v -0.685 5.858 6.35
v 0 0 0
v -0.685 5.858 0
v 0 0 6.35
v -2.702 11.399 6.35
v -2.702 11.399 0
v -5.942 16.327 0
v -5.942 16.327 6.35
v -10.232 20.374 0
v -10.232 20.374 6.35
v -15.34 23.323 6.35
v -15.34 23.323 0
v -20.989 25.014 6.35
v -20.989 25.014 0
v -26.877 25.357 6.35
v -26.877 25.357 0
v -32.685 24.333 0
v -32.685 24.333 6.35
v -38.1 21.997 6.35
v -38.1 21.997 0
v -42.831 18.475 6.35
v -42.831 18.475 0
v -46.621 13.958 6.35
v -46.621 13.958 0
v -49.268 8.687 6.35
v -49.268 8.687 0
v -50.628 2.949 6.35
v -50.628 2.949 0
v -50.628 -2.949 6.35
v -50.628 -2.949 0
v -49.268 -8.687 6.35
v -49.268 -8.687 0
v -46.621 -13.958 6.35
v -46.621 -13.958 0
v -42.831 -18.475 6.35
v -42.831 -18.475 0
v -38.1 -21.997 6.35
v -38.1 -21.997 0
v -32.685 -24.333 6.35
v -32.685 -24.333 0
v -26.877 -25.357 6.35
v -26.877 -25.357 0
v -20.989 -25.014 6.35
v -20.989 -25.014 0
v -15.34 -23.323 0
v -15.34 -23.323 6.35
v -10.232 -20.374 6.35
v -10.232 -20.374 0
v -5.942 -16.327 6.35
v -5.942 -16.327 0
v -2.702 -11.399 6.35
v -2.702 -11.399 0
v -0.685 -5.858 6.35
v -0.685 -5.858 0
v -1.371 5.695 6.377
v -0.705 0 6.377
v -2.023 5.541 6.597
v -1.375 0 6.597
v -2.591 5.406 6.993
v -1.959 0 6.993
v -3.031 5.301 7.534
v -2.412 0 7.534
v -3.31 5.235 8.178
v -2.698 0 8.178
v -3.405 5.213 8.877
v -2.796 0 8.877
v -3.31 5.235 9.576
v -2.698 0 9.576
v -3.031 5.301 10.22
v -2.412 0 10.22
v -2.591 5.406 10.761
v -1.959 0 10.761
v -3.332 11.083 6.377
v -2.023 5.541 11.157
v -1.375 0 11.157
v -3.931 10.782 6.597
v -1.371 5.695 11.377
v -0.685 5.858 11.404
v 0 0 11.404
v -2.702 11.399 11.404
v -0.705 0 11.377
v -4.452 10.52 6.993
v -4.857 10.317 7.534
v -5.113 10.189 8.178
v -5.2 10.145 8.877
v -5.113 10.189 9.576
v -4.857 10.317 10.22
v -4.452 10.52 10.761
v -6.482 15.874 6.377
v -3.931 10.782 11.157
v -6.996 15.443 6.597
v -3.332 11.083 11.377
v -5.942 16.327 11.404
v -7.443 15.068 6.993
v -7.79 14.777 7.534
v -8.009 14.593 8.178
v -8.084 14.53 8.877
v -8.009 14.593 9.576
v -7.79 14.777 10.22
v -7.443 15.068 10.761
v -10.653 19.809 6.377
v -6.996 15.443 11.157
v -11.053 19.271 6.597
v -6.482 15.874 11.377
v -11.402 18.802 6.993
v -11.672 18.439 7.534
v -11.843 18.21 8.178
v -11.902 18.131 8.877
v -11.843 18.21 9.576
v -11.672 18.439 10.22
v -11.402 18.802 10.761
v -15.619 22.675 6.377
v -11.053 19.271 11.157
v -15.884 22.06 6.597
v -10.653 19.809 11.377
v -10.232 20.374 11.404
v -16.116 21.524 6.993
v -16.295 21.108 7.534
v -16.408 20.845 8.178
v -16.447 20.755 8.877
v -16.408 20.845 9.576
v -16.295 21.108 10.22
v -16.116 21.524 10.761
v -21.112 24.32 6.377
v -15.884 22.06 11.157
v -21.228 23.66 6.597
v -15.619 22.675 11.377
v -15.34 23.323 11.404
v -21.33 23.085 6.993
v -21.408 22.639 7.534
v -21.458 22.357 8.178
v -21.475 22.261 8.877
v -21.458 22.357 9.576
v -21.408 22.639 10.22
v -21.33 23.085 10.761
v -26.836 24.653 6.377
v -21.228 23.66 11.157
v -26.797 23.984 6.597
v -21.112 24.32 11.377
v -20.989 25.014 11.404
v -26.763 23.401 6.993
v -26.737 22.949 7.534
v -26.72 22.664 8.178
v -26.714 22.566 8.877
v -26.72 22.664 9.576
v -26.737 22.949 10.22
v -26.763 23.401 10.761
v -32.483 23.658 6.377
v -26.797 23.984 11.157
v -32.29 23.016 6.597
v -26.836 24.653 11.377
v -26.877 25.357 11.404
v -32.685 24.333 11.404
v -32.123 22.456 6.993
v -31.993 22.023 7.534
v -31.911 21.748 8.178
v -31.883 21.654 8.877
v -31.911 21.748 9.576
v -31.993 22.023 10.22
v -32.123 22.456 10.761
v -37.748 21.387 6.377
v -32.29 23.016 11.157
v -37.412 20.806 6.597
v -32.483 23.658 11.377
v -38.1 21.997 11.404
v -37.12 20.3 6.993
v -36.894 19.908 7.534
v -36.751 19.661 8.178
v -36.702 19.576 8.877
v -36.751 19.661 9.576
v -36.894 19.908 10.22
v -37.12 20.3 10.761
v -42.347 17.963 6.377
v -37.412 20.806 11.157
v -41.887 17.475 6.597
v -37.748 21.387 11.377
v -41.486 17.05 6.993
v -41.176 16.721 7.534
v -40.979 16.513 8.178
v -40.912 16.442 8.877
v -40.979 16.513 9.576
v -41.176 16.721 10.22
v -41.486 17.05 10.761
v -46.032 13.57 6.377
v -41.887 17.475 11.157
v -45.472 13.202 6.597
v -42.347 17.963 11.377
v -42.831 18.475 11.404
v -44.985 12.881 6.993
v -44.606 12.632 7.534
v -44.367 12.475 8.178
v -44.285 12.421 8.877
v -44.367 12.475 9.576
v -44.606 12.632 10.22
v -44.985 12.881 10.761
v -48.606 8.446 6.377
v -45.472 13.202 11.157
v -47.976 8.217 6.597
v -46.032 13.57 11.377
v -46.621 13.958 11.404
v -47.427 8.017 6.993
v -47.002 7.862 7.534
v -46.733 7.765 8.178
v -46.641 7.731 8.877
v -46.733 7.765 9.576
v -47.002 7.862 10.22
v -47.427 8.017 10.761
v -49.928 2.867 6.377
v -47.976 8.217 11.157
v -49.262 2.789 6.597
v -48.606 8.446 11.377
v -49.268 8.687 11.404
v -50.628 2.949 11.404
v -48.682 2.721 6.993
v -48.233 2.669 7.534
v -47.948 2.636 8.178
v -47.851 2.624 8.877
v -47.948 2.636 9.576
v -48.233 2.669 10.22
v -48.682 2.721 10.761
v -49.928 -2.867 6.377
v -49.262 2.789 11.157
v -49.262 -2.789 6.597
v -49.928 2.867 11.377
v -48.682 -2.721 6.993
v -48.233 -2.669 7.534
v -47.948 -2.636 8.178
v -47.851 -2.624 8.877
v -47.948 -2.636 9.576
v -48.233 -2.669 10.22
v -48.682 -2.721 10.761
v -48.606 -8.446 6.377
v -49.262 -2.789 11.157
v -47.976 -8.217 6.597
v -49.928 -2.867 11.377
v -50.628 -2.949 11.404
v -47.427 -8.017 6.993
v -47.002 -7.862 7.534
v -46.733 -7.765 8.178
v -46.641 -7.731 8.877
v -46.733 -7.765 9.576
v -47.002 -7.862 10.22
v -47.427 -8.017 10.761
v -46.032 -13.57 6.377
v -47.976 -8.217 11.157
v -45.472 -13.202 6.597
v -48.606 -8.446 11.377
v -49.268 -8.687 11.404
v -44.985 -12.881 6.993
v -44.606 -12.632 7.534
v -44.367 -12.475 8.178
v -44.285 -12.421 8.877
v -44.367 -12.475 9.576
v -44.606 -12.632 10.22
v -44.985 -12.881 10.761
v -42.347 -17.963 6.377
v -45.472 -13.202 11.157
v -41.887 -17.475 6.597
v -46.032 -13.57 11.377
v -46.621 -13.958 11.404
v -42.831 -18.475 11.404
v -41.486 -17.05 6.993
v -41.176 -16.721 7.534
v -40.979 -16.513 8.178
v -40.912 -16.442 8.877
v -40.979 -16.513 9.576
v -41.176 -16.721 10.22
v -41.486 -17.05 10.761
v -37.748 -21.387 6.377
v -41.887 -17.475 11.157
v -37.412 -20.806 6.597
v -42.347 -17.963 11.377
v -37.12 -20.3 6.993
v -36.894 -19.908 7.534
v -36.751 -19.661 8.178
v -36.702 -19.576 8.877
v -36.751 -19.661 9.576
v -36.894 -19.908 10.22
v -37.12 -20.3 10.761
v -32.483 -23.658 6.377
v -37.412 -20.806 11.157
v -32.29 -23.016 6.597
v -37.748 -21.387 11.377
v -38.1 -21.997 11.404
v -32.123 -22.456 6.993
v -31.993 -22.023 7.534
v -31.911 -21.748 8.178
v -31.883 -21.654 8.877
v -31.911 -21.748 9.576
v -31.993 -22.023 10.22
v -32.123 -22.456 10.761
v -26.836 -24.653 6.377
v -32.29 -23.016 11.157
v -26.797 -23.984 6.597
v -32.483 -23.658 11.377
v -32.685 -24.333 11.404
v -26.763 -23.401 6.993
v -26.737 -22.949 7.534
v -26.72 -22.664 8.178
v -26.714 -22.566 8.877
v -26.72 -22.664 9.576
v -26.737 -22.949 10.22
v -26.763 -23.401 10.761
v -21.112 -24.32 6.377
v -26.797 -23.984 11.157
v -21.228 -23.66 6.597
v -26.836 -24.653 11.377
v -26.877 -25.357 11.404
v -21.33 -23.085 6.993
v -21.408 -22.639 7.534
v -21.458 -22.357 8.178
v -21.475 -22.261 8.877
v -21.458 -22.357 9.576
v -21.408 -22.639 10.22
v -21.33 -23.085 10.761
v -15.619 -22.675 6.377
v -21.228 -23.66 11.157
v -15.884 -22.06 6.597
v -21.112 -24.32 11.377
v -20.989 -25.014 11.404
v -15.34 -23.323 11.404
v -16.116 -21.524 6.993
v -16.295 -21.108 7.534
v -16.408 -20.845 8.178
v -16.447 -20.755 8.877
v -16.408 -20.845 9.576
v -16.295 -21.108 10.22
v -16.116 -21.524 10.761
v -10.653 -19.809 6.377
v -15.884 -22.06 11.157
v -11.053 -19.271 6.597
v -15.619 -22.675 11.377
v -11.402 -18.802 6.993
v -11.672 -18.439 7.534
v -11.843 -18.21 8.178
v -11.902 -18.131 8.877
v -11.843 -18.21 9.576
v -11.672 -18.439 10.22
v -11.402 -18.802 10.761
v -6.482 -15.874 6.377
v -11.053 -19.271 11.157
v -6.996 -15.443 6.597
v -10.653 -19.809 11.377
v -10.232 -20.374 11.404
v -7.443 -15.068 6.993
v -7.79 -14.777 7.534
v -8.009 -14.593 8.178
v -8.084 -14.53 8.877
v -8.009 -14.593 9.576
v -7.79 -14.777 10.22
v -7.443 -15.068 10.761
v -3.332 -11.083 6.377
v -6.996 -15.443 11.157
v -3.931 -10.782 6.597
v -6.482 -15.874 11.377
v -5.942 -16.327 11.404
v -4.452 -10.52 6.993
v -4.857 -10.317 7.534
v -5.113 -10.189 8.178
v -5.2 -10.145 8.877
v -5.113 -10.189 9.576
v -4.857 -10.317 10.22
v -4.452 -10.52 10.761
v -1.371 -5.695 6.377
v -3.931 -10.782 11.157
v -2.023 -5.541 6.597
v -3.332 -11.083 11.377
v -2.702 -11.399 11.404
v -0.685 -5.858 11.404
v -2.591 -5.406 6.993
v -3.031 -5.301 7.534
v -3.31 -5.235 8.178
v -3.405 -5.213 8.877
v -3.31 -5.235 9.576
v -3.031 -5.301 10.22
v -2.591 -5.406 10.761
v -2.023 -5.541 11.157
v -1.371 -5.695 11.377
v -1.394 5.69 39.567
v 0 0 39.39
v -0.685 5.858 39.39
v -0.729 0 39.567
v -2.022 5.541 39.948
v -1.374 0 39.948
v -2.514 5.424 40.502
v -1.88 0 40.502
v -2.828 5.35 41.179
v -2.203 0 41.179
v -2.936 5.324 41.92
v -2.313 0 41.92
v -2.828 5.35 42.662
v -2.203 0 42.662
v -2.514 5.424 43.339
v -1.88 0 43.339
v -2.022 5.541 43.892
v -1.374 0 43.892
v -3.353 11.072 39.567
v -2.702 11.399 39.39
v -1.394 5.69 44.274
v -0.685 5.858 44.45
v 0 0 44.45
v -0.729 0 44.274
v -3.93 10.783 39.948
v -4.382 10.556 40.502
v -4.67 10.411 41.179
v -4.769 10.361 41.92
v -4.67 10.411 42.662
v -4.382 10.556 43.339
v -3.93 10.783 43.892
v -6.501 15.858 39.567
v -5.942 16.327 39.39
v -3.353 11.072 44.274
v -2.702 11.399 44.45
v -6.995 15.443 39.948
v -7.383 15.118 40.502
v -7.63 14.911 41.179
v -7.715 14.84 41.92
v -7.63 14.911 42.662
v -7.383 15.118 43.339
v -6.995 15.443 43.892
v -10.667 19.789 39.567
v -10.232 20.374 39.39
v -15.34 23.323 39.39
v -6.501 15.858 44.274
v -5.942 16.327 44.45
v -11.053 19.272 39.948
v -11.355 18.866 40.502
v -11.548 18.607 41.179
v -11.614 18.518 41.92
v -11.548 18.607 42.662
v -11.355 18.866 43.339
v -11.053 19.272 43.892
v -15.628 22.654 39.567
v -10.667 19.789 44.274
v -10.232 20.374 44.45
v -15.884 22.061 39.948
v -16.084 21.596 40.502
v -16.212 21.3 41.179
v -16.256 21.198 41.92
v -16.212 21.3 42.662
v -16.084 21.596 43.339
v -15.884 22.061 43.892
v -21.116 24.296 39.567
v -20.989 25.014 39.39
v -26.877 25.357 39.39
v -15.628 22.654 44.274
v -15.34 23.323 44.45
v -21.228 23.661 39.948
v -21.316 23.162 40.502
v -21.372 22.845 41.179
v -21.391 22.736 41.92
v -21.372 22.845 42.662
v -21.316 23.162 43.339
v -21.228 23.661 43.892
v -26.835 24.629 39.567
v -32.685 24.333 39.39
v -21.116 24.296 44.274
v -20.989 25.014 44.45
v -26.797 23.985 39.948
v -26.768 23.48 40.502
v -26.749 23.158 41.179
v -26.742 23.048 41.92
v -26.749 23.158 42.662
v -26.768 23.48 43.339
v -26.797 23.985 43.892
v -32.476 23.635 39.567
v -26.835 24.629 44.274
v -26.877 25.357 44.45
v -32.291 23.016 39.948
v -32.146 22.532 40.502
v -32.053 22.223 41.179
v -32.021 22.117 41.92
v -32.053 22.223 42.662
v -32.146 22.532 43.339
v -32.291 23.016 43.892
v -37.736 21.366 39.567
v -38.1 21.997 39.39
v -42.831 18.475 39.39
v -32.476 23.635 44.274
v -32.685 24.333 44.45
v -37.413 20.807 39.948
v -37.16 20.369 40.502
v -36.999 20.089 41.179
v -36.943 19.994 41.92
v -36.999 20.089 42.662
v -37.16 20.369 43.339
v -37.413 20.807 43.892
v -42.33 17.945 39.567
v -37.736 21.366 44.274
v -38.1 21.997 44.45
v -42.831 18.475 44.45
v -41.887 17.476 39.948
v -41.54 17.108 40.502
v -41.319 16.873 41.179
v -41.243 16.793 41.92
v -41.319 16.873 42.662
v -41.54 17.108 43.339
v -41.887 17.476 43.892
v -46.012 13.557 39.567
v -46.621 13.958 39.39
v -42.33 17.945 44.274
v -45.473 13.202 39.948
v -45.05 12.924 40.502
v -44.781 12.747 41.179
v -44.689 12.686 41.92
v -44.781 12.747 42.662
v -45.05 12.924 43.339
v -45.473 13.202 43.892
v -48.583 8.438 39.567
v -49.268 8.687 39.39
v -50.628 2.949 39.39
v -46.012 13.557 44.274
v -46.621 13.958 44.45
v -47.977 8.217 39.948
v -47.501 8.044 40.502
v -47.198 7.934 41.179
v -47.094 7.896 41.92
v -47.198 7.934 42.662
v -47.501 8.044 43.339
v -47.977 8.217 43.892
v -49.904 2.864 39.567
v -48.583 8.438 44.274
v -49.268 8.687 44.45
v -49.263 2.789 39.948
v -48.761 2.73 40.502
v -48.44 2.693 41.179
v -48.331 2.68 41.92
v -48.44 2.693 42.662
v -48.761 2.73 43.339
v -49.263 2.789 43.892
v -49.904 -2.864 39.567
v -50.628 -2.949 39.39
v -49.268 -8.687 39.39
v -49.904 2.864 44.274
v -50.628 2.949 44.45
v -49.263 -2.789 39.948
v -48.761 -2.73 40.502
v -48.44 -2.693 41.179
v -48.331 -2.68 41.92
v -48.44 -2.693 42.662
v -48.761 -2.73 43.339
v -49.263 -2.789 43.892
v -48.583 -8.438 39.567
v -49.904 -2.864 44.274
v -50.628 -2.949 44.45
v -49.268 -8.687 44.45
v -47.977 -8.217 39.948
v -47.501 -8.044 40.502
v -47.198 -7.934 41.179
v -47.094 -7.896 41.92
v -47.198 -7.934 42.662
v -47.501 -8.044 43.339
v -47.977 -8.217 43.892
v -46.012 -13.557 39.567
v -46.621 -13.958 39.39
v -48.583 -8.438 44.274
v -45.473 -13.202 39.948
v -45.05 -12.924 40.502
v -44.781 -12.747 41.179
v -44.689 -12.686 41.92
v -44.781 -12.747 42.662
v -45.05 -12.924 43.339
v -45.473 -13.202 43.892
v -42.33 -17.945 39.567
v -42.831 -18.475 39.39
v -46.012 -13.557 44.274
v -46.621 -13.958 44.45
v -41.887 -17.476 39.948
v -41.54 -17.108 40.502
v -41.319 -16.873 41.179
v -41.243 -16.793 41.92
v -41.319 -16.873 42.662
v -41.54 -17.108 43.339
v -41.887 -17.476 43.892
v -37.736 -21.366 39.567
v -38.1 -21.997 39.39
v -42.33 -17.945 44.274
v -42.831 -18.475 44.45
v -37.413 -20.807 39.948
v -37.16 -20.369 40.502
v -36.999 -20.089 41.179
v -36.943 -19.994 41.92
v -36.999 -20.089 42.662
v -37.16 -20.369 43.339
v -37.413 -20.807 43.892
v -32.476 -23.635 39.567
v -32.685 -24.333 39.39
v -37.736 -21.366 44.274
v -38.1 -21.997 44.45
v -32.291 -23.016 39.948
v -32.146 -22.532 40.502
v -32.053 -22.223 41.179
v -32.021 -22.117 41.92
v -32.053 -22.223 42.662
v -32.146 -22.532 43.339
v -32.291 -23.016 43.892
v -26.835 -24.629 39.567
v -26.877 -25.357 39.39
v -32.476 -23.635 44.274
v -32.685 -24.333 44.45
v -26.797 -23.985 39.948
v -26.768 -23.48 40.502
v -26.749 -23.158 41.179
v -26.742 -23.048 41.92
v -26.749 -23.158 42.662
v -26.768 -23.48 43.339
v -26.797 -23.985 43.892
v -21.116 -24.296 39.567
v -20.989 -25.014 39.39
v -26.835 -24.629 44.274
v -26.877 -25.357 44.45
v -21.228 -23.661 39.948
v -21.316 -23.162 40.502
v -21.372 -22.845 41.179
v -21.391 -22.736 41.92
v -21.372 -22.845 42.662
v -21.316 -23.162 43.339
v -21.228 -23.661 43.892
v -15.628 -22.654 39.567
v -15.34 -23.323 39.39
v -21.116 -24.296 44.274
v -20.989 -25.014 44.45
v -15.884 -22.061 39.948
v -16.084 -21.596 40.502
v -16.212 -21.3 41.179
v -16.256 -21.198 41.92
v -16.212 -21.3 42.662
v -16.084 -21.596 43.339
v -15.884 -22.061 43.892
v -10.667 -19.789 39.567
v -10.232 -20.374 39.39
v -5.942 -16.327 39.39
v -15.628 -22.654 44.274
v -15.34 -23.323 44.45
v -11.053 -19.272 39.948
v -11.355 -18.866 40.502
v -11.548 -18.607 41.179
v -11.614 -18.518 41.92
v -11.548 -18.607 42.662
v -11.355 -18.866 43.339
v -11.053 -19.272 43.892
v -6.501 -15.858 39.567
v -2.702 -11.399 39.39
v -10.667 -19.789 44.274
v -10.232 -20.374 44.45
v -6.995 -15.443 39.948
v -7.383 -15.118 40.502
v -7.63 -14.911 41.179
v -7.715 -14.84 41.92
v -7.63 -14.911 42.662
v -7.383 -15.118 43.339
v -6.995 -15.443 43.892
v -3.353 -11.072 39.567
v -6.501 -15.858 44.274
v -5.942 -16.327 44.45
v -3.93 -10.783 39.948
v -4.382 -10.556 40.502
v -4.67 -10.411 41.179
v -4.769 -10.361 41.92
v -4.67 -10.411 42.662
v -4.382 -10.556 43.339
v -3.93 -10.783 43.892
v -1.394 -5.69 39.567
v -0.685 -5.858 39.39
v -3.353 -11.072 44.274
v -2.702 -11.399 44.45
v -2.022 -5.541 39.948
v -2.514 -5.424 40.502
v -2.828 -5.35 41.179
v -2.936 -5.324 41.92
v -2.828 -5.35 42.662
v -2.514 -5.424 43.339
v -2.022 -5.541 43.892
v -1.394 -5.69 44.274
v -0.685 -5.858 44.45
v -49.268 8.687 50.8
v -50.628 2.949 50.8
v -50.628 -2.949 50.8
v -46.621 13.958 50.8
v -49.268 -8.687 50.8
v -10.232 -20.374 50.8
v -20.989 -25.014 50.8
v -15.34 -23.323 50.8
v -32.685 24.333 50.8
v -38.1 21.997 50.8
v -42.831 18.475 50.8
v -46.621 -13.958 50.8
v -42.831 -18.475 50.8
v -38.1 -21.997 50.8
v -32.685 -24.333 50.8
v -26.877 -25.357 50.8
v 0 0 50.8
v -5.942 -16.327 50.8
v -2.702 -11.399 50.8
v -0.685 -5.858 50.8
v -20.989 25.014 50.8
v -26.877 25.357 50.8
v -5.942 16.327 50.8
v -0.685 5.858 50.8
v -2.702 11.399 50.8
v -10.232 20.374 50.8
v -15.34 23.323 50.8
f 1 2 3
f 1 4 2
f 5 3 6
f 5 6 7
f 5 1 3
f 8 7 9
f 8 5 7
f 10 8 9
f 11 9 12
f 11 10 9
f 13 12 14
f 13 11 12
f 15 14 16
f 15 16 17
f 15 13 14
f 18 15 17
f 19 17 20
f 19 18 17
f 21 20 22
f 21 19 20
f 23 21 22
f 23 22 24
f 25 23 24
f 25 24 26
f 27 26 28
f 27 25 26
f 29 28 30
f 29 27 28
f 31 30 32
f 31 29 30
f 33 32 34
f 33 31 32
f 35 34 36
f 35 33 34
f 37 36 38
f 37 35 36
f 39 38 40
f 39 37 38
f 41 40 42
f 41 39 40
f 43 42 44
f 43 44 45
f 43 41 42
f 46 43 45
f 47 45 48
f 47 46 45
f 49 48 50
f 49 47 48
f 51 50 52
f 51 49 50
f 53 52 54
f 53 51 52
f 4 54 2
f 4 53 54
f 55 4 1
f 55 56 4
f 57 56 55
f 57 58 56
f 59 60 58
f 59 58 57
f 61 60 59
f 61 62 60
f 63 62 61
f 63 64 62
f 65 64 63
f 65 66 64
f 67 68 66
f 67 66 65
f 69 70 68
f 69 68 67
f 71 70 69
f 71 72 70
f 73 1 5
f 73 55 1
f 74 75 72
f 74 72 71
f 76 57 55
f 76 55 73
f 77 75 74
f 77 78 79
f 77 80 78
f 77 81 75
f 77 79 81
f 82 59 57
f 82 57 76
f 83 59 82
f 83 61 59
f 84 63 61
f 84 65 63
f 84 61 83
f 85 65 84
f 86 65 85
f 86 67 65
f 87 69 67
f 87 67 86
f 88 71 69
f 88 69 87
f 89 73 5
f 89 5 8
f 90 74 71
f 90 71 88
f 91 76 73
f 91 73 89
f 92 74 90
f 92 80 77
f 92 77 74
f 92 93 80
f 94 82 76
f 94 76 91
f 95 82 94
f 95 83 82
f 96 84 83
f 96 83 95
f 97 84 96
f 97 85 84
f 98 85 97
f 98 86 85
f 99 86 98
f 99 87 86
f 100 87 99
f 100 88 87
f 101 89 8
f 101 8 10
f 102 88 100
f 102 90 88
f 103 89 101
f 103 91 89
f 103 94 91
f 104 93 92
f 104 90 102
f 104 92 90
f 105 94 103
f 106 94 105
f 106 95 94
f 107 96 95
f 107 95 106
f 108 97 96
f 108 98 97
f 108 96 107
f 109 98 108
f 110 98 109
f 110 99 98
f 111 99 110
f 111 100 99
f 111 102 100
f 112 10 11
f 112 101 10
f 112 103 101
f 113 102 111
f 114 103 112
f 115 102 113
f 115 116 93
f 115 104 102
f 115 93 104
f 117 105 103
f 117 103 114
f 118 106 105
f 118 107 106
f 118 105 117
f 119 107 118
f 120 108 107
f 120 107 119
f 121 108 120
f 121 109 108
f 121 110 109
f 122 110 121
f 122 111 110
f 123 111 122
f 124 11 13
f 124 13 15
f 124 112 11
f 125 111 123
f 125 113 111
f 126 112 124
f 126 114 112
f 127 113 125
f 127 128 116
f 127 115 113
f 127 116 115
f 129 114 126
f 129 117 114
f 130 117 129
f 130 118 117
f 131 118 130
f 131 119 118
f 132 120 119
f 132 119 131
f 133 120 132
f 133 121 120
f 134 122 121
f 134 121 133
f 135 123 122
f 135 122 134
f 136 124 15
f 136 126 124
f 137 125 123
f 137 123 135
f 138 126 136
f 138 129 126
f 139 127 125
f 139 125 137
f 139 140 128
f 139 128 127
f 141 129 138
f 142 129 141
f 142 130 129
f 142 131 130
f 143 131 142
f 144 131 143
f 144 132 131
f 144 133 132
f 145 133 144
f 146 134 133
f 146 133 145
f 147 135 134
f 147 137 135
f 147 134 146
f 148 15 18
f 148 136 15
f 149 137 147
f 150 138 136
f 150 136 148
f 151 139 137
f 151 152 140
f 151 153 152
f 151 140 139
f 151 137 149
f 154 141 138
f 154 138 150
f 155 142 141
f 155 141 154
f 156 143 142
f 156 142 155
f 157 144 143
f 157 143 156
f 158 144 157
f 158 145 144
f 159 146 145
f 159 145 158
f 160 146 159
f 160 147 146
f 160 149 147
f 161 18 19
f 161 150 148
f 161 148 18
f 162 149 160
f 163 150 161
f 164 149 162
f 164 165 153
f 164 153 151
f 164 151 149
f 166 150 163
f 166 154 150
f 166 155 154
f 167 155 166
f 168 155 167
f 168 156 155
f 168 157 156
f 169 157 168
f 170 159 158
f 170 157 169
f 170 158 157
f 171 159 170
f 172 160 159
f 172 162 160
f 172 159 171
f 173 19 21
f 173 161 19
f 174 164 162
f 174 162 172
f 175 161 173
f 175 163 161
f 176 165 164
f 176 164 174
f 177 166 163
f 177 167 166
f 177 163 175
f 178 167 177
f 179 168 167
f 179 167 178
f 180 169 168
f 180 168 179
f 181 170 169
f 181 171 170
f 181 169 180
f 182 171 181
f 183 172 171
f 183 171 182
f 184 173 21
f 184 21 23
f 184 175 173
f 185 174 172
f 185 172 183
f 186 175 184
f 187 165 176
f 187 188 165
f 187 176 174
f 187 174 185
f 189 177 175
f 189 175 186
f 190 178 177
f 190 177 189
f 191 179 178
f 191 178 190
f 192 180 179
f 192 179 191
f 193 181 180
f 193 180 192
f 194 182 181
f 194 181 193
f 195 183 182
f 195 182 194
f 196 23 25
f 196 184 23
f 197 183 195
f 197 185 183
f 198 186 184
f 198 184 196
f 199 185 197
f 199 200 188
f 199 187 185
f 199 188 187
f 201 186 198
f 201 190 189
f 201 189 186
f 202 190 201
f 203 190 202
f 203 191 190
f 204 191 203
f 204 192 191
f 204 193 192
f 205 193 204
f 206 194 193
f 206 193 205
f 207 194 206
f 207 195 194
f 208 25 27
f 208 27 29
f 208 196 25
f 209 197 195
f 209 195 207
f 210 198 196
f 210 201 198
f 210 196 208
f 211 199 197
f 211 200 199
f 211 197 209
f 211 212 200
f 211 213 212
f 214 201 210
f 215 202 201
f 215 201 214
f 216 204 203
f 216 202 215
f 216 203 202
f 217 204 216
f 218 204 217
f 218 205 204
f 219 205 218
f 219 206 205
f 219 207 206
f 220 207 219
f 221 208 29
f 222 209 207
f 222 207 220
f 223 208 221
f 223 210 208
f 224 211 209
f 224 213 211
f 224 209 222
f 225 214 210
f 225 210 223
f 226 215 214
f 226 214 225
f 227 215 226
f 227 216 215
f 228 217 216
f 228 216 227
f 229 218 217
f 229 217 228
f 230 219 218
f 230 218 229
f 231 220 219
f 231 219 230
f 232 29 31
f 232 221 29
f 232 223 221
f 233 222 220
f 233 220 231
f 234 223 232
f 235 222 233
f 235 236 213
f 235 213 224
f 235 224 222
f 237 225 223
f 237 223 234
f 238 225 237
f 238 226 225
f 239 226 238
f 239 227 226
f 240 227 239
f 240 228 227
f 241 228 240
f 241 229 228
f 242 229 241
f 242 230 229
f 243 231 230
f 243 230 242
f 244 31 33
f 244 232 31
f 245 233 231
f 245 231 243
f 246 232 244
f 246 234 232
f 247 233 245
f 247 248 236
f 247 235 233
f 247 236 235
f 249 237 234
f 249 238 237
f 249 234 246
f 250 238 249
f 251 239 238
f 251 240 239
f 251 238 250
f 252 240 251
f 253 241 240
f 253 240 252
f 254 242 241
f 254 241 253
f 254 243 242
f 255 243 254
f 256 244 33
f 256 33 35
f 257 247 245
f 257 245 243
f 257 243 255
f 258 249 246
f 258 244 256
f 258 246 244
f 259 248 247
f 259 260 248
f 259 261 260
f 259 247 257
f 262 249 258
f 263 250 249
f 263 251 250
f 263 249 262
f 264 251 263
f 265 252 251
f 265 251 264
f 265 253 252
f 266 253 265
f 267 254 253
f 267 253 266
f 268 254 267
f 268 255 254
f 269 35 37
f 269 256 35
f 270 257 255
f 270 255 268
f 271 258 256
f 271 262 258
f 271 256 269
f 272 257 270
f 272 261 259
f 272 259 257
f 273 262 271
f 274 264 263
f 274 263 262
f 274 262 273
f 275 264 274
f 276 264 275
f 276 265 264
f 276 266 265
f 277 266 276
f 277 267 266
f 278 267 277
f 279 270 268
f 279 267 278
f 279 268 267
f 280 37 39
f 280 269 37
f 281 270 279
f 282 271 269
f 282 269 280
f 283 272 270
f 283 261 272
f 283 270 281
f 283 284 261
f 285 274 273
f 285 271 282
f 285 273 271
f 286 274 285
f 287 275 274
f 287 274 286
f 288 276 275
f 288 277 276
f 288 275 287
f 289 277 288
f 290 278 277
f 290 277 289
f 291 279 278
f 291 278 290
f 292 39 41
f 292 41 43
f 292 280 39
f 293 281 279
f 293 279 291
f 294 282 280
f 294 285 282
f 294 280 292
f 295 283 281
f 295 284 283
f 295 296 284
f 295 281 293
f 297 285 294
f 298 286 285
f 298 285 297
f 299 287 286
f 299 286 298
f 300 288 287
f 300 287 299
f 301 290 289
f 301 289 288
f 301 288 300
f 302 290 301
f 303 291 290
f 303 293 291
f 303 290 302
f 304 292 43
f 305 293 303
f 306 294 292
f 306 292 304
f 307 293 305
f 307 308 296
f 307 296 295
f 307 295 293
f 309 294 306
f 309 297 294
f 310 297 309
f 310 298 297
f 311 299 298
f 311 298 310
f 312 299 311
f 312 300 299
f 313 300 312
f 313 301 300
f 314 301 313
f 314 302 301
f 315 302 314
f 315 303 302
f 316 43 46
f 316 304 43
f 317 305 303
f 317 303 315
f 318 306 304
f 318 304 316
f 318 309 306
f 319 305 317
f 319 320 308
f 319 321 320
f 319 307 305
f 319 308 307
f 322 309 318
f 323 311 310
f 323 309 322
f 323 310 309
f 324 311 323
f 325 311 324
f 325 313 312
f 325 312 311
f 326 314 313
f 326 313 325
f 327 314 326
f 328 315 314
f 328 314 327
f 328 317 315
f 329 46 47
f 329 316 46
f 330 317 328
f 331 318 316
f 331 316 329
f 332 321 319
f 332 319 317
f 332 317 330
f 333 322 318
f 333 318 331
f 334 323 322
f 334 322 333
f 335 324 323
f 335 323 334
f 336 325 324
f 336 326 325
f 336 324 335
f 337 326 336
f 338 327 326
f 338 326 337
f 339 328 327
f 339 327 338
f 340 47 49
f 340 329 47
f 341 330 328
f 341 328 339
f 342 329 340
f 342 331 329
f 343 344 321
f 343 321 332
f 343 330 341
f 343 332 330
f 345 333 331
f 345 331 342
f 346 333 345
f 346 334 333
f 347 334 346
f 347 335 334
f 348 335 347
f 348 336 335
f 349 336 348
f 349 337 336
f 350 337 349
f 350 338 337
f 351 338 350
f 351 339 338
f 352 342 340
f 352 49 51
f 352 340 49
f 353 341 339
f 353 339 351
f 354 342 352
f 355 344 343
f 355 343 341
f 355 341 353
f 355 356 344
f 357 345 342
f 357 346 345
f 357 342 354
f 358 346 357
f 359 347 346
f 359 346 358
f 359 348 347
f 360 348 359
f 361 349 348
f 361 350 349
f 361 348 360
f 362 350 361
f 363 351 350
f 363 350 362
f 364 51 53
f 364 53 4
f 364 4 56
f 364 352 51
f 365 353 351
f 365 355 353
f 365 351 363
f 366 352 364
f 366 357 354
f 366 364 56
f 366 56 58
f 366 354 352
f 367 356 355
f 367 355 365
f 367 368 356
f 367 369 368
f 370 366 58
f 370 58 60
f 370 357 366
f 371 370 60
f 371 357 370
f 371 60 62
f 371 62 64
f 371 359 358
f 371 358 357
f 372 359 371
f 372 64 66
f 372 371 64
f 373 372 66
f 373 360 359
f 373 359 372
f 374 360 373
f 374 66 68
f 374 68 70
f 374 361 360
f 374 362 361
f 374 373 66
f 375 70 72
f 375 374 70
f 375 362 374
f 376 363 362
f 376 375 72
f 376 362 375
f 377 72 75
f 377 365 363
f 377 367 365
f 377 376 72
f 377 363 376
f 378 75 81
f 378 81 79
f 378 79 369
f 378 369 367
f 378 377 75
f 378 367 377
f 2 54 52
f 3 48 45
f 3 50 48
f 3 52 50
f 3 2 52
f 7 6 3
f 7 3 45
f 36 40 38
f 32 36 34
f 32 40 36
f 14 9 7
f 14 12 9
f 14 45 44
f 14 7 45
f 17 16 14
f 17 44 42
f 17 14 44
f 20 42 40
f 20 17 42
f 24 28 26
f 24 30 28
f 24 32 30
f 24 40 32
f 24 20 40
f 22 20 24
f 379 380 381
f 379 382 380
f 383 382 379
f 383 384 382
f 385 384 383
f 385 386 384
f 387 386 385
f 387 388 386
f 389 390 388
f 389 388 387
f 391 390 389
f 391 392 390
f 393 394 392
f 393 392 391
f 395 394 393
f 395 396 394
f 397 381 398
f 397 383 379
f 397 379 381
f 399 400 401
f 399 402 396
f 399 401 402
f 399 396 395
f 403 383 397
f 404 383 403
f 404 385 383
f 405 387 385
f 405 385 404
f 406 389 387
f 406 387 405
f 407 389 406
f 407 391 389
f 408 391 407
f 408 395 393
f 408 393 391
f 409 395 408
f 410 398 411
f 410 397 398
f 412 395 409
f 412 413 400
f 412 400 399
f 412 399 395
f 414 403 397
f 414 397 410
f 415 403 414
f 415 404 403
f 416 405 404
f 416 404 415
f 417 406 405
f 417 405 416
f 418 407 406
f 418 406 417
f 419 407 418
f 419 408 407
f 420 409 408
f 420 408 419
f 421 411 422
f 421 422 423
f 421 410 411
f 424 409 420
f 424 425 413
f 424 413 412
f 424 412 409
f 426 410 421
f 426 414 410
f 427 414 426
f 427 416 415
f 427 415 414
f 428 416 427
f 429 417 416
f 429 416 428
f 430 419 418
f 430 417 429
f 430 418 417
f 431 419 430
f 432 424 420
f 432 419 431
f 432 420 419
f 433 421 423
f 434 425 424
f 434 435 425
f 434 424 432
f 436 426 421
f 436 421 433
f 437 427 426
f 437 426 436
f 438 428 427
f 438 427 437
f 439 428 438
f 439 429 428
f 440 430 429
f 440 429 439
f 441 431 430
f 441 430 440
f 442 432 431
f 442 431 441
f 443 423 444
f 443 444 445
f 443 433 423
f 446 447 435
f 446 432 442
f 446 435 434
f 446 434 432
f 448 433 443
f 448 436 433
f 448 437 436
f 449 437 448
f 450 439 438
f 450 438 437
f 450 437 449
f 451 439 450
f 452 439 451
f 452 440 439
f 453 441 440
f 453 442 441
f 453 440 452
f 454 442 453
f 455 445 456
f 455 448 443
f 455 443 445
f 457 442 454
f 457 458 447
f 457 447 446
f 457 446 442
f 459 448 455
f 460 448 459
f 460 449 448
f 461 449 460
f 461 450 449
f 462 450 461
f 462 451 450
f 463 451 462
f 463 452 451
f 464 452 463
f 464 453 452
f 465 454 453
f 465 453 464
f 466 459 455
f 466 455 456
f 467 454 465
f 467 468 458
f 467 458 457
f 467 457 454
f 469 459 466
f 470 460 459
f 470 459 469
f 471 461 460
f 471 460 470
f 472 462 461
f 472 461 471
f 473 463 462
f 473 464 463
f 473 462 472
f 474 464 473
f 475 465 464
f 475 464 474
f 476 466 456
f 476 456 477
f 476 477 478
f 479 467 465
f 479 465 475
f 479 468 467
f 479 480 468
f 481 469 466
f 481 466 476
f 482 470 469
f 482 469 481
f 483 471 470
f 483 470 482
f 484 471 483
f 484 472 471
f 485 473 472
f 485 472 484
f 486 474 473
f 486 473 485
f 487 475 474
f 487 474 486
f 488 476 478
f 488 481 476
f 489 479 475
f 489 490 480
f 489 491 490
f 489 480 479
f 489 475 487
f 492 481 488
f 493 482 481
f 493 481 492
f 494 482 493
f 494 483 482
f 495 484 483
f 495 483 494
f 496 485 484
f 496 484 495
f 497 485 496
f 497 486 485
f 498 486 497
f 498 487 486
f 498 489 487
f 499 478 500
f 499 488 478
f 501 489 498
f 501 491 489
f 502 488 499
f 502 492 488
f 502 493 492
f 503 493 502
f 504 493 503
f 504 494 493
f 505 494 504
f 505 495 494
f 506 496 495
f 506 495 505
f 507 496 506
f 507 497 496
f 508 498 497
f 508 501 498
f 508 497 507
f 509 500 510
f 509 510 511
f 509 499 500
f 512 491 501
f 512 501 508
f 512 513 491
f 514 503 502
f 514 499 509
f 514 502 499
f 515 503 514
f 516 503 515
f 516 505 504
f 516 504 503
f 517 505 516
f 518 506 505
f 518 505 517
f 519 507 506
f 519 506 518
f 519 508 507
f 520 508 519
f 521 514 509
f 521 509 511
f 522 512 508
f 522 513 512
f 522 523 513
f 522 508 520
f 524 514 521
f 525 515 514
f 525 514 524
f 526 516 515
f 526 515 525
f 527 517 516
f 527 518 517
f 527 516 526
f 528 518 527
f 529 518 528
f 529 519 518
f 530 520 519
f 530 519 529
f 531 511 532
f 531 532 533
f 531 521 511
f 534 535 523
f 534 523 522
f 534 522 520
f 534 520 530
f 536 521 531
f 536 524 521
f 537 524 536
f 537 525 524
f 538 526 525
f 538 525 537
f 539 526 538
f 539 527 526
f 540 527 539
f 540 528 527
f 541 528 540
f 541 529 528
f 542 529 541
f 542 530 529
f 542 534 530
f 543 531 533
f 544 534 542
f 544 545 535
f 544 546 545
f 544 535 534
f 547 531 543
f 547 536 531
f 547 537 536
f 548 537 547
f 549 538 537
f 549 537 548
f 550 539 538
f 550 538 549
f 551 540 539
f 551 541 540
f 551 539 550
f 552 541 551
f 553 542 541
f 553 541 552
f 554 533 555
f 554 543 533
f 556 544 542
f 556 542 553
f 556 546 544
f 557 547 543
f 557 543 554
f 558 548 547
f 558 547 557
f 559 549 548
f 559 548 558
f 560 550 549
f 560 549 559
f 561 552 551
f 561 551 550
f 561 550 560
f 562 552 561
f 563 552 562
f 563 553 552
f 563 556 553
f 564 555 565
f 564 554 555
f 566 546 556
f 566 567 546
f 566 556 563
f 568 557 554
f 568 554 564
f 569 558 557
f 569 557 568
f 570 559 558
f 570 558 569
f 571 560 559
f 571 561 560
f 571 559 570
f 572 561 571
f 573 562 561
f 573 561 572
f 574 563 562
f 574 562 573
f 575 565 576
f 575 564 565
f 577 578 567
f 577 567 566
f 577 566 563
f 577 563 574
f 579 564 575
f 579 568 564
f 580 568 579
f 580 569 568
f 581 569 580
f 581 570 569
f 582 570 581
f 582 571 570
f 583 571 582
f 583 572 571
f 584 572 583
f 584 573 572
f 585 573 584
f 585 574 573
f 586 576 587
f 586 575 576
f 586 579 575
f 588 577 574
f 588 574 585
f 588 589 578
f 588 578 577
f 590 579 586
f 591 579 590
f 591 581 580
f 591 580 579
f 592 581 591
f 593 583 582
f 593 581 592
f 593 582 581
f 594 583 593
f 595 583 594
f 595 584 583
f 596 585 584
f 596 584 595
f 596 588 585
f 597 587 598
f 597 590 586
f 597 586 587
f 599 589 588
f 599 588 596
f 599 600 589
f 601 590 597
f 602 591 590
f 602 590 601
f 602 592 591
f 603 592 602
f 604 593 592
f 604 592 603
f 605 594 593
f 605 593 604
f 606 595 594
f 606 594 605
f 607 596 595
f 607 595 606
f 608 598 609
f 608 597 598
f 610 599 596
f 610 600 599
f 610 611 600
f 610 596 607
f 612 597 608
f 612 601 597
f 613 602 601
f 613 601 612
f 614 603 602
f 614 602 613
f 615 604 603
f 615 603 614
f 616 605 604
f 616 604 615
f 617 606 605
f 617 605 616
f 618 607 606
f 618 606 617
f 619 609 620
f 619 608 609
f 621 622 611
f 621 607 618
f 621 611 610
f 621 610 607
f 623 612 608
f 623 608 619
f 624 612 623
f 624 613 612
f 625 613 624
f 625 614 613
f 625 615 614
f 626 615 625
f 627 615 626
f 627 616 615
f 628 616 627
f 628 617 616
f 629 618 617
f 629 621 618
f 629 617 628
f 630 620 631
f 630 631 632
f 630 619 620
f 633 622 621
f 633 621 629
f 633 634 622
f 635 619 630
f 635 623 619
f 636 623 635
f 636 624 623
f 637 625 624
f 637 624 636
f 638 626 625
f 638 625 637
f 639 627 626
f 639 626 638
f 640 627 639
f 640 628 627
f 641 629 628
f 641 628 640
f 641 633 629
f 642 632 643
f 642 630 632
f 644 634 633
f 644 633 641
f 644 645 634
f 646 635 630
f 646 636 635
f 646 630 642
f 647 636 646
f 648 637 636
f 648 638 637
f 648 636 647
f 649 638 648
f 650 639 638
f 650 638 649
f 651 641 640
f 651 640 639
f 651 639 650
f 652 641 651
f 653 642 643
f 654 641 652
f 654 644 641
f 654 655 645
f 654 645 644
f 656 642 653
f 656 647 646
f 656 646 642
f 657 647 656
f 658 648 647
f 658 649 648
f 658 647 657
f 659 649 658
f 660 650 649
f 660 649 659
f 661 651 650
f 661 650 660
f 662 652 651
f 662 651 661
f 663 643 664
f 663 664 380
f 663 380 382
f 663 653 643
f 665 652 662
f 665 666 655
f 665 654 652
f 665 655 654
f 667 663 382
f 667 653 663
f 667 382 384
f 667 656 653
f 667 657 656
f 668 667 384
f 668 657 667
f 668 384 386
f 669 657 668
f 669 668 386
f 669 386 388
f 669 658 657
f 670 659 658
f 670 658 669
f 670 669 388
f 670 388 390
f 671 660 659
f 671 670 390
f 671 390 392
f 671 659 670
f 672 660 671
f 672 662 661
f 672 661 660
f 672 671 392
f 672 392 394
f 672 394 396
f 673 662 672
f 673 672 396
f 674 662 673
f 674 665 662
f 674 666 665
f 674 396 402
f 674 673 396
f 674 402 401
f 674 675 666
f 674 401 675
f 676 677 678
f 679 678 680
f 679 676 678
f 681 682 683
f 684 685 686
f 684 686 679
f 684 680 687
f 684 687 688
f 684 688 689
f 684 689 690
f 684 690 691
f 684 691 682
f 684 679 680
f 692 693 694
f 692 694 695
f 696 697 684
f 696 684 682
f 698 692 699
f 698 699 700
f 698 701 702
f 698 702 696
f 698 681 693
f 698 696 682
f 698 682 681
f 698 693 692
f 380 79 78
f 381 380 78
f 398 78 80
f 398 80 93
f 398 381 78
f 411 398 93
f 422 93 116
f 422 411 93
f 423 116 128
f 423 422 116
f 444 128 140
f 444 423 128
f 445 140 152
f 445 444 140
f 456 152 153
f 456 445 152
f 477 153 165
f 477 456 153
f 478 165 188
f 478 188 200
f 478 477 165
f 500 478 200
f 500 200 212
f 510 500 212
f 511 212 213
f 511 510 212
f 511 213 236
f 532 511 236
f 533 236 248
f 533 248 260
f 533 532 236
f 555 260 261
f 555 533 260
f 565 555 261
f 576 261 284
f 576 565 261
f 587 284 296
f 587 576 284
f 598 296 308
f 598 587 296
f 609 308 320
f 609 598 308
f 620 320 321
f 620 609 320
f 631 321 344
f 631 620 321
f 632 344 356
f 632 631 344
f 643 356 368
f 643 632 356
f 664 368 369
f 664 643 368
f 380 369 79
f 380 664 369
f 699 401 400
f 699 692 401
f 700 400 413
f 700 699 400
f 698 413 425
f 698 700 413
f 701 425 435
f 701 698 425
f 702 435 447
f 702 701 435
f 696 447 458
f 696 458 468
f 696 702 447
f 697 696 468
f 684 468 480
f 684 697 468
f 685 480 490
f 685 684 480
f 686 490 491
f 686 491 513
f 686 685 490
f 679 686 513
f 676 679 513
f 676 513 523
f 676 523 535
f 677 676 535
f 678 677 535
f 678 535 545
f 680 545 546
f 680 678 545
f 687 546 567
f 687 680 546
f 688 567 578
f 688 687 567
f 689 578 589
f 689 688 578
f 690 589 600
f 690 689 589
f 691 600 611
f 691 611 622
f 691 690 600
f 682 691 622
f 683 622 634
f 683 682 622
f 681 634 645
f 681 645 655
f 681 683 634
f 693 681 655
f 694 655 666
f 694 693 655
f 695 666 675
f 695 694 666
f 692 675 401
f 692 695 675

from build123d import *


with BuildPart() as f1:
    # F0 (on Front) → F1 (revolve)
    with BuildSketch(Plane.XZ):
        with BuildLine():
            Line((-25.4, 0), (0, 0))
            Line((0, 0), (0, 6.35))
            ThreePointArc((0, 6.35), (-2.795959, 8.87707), (0, 11.404141))
            Line((0, 11.404141), (0, 39.390257))
            ThreePointArc((0, 39.390257), (-2.313396, 41.920128), (0, 44.45))
            Line((0, 44.45), (0, 50.8))
            Line((0, 50.8), (-25.4, 50.8))
            Line((-25.4, 50.8), (-25.4, 0))
        make_face()
    revolve(axis=Axis((-25.4, 0, 25.4), (0, 0, 1)))


solid = f1.part
